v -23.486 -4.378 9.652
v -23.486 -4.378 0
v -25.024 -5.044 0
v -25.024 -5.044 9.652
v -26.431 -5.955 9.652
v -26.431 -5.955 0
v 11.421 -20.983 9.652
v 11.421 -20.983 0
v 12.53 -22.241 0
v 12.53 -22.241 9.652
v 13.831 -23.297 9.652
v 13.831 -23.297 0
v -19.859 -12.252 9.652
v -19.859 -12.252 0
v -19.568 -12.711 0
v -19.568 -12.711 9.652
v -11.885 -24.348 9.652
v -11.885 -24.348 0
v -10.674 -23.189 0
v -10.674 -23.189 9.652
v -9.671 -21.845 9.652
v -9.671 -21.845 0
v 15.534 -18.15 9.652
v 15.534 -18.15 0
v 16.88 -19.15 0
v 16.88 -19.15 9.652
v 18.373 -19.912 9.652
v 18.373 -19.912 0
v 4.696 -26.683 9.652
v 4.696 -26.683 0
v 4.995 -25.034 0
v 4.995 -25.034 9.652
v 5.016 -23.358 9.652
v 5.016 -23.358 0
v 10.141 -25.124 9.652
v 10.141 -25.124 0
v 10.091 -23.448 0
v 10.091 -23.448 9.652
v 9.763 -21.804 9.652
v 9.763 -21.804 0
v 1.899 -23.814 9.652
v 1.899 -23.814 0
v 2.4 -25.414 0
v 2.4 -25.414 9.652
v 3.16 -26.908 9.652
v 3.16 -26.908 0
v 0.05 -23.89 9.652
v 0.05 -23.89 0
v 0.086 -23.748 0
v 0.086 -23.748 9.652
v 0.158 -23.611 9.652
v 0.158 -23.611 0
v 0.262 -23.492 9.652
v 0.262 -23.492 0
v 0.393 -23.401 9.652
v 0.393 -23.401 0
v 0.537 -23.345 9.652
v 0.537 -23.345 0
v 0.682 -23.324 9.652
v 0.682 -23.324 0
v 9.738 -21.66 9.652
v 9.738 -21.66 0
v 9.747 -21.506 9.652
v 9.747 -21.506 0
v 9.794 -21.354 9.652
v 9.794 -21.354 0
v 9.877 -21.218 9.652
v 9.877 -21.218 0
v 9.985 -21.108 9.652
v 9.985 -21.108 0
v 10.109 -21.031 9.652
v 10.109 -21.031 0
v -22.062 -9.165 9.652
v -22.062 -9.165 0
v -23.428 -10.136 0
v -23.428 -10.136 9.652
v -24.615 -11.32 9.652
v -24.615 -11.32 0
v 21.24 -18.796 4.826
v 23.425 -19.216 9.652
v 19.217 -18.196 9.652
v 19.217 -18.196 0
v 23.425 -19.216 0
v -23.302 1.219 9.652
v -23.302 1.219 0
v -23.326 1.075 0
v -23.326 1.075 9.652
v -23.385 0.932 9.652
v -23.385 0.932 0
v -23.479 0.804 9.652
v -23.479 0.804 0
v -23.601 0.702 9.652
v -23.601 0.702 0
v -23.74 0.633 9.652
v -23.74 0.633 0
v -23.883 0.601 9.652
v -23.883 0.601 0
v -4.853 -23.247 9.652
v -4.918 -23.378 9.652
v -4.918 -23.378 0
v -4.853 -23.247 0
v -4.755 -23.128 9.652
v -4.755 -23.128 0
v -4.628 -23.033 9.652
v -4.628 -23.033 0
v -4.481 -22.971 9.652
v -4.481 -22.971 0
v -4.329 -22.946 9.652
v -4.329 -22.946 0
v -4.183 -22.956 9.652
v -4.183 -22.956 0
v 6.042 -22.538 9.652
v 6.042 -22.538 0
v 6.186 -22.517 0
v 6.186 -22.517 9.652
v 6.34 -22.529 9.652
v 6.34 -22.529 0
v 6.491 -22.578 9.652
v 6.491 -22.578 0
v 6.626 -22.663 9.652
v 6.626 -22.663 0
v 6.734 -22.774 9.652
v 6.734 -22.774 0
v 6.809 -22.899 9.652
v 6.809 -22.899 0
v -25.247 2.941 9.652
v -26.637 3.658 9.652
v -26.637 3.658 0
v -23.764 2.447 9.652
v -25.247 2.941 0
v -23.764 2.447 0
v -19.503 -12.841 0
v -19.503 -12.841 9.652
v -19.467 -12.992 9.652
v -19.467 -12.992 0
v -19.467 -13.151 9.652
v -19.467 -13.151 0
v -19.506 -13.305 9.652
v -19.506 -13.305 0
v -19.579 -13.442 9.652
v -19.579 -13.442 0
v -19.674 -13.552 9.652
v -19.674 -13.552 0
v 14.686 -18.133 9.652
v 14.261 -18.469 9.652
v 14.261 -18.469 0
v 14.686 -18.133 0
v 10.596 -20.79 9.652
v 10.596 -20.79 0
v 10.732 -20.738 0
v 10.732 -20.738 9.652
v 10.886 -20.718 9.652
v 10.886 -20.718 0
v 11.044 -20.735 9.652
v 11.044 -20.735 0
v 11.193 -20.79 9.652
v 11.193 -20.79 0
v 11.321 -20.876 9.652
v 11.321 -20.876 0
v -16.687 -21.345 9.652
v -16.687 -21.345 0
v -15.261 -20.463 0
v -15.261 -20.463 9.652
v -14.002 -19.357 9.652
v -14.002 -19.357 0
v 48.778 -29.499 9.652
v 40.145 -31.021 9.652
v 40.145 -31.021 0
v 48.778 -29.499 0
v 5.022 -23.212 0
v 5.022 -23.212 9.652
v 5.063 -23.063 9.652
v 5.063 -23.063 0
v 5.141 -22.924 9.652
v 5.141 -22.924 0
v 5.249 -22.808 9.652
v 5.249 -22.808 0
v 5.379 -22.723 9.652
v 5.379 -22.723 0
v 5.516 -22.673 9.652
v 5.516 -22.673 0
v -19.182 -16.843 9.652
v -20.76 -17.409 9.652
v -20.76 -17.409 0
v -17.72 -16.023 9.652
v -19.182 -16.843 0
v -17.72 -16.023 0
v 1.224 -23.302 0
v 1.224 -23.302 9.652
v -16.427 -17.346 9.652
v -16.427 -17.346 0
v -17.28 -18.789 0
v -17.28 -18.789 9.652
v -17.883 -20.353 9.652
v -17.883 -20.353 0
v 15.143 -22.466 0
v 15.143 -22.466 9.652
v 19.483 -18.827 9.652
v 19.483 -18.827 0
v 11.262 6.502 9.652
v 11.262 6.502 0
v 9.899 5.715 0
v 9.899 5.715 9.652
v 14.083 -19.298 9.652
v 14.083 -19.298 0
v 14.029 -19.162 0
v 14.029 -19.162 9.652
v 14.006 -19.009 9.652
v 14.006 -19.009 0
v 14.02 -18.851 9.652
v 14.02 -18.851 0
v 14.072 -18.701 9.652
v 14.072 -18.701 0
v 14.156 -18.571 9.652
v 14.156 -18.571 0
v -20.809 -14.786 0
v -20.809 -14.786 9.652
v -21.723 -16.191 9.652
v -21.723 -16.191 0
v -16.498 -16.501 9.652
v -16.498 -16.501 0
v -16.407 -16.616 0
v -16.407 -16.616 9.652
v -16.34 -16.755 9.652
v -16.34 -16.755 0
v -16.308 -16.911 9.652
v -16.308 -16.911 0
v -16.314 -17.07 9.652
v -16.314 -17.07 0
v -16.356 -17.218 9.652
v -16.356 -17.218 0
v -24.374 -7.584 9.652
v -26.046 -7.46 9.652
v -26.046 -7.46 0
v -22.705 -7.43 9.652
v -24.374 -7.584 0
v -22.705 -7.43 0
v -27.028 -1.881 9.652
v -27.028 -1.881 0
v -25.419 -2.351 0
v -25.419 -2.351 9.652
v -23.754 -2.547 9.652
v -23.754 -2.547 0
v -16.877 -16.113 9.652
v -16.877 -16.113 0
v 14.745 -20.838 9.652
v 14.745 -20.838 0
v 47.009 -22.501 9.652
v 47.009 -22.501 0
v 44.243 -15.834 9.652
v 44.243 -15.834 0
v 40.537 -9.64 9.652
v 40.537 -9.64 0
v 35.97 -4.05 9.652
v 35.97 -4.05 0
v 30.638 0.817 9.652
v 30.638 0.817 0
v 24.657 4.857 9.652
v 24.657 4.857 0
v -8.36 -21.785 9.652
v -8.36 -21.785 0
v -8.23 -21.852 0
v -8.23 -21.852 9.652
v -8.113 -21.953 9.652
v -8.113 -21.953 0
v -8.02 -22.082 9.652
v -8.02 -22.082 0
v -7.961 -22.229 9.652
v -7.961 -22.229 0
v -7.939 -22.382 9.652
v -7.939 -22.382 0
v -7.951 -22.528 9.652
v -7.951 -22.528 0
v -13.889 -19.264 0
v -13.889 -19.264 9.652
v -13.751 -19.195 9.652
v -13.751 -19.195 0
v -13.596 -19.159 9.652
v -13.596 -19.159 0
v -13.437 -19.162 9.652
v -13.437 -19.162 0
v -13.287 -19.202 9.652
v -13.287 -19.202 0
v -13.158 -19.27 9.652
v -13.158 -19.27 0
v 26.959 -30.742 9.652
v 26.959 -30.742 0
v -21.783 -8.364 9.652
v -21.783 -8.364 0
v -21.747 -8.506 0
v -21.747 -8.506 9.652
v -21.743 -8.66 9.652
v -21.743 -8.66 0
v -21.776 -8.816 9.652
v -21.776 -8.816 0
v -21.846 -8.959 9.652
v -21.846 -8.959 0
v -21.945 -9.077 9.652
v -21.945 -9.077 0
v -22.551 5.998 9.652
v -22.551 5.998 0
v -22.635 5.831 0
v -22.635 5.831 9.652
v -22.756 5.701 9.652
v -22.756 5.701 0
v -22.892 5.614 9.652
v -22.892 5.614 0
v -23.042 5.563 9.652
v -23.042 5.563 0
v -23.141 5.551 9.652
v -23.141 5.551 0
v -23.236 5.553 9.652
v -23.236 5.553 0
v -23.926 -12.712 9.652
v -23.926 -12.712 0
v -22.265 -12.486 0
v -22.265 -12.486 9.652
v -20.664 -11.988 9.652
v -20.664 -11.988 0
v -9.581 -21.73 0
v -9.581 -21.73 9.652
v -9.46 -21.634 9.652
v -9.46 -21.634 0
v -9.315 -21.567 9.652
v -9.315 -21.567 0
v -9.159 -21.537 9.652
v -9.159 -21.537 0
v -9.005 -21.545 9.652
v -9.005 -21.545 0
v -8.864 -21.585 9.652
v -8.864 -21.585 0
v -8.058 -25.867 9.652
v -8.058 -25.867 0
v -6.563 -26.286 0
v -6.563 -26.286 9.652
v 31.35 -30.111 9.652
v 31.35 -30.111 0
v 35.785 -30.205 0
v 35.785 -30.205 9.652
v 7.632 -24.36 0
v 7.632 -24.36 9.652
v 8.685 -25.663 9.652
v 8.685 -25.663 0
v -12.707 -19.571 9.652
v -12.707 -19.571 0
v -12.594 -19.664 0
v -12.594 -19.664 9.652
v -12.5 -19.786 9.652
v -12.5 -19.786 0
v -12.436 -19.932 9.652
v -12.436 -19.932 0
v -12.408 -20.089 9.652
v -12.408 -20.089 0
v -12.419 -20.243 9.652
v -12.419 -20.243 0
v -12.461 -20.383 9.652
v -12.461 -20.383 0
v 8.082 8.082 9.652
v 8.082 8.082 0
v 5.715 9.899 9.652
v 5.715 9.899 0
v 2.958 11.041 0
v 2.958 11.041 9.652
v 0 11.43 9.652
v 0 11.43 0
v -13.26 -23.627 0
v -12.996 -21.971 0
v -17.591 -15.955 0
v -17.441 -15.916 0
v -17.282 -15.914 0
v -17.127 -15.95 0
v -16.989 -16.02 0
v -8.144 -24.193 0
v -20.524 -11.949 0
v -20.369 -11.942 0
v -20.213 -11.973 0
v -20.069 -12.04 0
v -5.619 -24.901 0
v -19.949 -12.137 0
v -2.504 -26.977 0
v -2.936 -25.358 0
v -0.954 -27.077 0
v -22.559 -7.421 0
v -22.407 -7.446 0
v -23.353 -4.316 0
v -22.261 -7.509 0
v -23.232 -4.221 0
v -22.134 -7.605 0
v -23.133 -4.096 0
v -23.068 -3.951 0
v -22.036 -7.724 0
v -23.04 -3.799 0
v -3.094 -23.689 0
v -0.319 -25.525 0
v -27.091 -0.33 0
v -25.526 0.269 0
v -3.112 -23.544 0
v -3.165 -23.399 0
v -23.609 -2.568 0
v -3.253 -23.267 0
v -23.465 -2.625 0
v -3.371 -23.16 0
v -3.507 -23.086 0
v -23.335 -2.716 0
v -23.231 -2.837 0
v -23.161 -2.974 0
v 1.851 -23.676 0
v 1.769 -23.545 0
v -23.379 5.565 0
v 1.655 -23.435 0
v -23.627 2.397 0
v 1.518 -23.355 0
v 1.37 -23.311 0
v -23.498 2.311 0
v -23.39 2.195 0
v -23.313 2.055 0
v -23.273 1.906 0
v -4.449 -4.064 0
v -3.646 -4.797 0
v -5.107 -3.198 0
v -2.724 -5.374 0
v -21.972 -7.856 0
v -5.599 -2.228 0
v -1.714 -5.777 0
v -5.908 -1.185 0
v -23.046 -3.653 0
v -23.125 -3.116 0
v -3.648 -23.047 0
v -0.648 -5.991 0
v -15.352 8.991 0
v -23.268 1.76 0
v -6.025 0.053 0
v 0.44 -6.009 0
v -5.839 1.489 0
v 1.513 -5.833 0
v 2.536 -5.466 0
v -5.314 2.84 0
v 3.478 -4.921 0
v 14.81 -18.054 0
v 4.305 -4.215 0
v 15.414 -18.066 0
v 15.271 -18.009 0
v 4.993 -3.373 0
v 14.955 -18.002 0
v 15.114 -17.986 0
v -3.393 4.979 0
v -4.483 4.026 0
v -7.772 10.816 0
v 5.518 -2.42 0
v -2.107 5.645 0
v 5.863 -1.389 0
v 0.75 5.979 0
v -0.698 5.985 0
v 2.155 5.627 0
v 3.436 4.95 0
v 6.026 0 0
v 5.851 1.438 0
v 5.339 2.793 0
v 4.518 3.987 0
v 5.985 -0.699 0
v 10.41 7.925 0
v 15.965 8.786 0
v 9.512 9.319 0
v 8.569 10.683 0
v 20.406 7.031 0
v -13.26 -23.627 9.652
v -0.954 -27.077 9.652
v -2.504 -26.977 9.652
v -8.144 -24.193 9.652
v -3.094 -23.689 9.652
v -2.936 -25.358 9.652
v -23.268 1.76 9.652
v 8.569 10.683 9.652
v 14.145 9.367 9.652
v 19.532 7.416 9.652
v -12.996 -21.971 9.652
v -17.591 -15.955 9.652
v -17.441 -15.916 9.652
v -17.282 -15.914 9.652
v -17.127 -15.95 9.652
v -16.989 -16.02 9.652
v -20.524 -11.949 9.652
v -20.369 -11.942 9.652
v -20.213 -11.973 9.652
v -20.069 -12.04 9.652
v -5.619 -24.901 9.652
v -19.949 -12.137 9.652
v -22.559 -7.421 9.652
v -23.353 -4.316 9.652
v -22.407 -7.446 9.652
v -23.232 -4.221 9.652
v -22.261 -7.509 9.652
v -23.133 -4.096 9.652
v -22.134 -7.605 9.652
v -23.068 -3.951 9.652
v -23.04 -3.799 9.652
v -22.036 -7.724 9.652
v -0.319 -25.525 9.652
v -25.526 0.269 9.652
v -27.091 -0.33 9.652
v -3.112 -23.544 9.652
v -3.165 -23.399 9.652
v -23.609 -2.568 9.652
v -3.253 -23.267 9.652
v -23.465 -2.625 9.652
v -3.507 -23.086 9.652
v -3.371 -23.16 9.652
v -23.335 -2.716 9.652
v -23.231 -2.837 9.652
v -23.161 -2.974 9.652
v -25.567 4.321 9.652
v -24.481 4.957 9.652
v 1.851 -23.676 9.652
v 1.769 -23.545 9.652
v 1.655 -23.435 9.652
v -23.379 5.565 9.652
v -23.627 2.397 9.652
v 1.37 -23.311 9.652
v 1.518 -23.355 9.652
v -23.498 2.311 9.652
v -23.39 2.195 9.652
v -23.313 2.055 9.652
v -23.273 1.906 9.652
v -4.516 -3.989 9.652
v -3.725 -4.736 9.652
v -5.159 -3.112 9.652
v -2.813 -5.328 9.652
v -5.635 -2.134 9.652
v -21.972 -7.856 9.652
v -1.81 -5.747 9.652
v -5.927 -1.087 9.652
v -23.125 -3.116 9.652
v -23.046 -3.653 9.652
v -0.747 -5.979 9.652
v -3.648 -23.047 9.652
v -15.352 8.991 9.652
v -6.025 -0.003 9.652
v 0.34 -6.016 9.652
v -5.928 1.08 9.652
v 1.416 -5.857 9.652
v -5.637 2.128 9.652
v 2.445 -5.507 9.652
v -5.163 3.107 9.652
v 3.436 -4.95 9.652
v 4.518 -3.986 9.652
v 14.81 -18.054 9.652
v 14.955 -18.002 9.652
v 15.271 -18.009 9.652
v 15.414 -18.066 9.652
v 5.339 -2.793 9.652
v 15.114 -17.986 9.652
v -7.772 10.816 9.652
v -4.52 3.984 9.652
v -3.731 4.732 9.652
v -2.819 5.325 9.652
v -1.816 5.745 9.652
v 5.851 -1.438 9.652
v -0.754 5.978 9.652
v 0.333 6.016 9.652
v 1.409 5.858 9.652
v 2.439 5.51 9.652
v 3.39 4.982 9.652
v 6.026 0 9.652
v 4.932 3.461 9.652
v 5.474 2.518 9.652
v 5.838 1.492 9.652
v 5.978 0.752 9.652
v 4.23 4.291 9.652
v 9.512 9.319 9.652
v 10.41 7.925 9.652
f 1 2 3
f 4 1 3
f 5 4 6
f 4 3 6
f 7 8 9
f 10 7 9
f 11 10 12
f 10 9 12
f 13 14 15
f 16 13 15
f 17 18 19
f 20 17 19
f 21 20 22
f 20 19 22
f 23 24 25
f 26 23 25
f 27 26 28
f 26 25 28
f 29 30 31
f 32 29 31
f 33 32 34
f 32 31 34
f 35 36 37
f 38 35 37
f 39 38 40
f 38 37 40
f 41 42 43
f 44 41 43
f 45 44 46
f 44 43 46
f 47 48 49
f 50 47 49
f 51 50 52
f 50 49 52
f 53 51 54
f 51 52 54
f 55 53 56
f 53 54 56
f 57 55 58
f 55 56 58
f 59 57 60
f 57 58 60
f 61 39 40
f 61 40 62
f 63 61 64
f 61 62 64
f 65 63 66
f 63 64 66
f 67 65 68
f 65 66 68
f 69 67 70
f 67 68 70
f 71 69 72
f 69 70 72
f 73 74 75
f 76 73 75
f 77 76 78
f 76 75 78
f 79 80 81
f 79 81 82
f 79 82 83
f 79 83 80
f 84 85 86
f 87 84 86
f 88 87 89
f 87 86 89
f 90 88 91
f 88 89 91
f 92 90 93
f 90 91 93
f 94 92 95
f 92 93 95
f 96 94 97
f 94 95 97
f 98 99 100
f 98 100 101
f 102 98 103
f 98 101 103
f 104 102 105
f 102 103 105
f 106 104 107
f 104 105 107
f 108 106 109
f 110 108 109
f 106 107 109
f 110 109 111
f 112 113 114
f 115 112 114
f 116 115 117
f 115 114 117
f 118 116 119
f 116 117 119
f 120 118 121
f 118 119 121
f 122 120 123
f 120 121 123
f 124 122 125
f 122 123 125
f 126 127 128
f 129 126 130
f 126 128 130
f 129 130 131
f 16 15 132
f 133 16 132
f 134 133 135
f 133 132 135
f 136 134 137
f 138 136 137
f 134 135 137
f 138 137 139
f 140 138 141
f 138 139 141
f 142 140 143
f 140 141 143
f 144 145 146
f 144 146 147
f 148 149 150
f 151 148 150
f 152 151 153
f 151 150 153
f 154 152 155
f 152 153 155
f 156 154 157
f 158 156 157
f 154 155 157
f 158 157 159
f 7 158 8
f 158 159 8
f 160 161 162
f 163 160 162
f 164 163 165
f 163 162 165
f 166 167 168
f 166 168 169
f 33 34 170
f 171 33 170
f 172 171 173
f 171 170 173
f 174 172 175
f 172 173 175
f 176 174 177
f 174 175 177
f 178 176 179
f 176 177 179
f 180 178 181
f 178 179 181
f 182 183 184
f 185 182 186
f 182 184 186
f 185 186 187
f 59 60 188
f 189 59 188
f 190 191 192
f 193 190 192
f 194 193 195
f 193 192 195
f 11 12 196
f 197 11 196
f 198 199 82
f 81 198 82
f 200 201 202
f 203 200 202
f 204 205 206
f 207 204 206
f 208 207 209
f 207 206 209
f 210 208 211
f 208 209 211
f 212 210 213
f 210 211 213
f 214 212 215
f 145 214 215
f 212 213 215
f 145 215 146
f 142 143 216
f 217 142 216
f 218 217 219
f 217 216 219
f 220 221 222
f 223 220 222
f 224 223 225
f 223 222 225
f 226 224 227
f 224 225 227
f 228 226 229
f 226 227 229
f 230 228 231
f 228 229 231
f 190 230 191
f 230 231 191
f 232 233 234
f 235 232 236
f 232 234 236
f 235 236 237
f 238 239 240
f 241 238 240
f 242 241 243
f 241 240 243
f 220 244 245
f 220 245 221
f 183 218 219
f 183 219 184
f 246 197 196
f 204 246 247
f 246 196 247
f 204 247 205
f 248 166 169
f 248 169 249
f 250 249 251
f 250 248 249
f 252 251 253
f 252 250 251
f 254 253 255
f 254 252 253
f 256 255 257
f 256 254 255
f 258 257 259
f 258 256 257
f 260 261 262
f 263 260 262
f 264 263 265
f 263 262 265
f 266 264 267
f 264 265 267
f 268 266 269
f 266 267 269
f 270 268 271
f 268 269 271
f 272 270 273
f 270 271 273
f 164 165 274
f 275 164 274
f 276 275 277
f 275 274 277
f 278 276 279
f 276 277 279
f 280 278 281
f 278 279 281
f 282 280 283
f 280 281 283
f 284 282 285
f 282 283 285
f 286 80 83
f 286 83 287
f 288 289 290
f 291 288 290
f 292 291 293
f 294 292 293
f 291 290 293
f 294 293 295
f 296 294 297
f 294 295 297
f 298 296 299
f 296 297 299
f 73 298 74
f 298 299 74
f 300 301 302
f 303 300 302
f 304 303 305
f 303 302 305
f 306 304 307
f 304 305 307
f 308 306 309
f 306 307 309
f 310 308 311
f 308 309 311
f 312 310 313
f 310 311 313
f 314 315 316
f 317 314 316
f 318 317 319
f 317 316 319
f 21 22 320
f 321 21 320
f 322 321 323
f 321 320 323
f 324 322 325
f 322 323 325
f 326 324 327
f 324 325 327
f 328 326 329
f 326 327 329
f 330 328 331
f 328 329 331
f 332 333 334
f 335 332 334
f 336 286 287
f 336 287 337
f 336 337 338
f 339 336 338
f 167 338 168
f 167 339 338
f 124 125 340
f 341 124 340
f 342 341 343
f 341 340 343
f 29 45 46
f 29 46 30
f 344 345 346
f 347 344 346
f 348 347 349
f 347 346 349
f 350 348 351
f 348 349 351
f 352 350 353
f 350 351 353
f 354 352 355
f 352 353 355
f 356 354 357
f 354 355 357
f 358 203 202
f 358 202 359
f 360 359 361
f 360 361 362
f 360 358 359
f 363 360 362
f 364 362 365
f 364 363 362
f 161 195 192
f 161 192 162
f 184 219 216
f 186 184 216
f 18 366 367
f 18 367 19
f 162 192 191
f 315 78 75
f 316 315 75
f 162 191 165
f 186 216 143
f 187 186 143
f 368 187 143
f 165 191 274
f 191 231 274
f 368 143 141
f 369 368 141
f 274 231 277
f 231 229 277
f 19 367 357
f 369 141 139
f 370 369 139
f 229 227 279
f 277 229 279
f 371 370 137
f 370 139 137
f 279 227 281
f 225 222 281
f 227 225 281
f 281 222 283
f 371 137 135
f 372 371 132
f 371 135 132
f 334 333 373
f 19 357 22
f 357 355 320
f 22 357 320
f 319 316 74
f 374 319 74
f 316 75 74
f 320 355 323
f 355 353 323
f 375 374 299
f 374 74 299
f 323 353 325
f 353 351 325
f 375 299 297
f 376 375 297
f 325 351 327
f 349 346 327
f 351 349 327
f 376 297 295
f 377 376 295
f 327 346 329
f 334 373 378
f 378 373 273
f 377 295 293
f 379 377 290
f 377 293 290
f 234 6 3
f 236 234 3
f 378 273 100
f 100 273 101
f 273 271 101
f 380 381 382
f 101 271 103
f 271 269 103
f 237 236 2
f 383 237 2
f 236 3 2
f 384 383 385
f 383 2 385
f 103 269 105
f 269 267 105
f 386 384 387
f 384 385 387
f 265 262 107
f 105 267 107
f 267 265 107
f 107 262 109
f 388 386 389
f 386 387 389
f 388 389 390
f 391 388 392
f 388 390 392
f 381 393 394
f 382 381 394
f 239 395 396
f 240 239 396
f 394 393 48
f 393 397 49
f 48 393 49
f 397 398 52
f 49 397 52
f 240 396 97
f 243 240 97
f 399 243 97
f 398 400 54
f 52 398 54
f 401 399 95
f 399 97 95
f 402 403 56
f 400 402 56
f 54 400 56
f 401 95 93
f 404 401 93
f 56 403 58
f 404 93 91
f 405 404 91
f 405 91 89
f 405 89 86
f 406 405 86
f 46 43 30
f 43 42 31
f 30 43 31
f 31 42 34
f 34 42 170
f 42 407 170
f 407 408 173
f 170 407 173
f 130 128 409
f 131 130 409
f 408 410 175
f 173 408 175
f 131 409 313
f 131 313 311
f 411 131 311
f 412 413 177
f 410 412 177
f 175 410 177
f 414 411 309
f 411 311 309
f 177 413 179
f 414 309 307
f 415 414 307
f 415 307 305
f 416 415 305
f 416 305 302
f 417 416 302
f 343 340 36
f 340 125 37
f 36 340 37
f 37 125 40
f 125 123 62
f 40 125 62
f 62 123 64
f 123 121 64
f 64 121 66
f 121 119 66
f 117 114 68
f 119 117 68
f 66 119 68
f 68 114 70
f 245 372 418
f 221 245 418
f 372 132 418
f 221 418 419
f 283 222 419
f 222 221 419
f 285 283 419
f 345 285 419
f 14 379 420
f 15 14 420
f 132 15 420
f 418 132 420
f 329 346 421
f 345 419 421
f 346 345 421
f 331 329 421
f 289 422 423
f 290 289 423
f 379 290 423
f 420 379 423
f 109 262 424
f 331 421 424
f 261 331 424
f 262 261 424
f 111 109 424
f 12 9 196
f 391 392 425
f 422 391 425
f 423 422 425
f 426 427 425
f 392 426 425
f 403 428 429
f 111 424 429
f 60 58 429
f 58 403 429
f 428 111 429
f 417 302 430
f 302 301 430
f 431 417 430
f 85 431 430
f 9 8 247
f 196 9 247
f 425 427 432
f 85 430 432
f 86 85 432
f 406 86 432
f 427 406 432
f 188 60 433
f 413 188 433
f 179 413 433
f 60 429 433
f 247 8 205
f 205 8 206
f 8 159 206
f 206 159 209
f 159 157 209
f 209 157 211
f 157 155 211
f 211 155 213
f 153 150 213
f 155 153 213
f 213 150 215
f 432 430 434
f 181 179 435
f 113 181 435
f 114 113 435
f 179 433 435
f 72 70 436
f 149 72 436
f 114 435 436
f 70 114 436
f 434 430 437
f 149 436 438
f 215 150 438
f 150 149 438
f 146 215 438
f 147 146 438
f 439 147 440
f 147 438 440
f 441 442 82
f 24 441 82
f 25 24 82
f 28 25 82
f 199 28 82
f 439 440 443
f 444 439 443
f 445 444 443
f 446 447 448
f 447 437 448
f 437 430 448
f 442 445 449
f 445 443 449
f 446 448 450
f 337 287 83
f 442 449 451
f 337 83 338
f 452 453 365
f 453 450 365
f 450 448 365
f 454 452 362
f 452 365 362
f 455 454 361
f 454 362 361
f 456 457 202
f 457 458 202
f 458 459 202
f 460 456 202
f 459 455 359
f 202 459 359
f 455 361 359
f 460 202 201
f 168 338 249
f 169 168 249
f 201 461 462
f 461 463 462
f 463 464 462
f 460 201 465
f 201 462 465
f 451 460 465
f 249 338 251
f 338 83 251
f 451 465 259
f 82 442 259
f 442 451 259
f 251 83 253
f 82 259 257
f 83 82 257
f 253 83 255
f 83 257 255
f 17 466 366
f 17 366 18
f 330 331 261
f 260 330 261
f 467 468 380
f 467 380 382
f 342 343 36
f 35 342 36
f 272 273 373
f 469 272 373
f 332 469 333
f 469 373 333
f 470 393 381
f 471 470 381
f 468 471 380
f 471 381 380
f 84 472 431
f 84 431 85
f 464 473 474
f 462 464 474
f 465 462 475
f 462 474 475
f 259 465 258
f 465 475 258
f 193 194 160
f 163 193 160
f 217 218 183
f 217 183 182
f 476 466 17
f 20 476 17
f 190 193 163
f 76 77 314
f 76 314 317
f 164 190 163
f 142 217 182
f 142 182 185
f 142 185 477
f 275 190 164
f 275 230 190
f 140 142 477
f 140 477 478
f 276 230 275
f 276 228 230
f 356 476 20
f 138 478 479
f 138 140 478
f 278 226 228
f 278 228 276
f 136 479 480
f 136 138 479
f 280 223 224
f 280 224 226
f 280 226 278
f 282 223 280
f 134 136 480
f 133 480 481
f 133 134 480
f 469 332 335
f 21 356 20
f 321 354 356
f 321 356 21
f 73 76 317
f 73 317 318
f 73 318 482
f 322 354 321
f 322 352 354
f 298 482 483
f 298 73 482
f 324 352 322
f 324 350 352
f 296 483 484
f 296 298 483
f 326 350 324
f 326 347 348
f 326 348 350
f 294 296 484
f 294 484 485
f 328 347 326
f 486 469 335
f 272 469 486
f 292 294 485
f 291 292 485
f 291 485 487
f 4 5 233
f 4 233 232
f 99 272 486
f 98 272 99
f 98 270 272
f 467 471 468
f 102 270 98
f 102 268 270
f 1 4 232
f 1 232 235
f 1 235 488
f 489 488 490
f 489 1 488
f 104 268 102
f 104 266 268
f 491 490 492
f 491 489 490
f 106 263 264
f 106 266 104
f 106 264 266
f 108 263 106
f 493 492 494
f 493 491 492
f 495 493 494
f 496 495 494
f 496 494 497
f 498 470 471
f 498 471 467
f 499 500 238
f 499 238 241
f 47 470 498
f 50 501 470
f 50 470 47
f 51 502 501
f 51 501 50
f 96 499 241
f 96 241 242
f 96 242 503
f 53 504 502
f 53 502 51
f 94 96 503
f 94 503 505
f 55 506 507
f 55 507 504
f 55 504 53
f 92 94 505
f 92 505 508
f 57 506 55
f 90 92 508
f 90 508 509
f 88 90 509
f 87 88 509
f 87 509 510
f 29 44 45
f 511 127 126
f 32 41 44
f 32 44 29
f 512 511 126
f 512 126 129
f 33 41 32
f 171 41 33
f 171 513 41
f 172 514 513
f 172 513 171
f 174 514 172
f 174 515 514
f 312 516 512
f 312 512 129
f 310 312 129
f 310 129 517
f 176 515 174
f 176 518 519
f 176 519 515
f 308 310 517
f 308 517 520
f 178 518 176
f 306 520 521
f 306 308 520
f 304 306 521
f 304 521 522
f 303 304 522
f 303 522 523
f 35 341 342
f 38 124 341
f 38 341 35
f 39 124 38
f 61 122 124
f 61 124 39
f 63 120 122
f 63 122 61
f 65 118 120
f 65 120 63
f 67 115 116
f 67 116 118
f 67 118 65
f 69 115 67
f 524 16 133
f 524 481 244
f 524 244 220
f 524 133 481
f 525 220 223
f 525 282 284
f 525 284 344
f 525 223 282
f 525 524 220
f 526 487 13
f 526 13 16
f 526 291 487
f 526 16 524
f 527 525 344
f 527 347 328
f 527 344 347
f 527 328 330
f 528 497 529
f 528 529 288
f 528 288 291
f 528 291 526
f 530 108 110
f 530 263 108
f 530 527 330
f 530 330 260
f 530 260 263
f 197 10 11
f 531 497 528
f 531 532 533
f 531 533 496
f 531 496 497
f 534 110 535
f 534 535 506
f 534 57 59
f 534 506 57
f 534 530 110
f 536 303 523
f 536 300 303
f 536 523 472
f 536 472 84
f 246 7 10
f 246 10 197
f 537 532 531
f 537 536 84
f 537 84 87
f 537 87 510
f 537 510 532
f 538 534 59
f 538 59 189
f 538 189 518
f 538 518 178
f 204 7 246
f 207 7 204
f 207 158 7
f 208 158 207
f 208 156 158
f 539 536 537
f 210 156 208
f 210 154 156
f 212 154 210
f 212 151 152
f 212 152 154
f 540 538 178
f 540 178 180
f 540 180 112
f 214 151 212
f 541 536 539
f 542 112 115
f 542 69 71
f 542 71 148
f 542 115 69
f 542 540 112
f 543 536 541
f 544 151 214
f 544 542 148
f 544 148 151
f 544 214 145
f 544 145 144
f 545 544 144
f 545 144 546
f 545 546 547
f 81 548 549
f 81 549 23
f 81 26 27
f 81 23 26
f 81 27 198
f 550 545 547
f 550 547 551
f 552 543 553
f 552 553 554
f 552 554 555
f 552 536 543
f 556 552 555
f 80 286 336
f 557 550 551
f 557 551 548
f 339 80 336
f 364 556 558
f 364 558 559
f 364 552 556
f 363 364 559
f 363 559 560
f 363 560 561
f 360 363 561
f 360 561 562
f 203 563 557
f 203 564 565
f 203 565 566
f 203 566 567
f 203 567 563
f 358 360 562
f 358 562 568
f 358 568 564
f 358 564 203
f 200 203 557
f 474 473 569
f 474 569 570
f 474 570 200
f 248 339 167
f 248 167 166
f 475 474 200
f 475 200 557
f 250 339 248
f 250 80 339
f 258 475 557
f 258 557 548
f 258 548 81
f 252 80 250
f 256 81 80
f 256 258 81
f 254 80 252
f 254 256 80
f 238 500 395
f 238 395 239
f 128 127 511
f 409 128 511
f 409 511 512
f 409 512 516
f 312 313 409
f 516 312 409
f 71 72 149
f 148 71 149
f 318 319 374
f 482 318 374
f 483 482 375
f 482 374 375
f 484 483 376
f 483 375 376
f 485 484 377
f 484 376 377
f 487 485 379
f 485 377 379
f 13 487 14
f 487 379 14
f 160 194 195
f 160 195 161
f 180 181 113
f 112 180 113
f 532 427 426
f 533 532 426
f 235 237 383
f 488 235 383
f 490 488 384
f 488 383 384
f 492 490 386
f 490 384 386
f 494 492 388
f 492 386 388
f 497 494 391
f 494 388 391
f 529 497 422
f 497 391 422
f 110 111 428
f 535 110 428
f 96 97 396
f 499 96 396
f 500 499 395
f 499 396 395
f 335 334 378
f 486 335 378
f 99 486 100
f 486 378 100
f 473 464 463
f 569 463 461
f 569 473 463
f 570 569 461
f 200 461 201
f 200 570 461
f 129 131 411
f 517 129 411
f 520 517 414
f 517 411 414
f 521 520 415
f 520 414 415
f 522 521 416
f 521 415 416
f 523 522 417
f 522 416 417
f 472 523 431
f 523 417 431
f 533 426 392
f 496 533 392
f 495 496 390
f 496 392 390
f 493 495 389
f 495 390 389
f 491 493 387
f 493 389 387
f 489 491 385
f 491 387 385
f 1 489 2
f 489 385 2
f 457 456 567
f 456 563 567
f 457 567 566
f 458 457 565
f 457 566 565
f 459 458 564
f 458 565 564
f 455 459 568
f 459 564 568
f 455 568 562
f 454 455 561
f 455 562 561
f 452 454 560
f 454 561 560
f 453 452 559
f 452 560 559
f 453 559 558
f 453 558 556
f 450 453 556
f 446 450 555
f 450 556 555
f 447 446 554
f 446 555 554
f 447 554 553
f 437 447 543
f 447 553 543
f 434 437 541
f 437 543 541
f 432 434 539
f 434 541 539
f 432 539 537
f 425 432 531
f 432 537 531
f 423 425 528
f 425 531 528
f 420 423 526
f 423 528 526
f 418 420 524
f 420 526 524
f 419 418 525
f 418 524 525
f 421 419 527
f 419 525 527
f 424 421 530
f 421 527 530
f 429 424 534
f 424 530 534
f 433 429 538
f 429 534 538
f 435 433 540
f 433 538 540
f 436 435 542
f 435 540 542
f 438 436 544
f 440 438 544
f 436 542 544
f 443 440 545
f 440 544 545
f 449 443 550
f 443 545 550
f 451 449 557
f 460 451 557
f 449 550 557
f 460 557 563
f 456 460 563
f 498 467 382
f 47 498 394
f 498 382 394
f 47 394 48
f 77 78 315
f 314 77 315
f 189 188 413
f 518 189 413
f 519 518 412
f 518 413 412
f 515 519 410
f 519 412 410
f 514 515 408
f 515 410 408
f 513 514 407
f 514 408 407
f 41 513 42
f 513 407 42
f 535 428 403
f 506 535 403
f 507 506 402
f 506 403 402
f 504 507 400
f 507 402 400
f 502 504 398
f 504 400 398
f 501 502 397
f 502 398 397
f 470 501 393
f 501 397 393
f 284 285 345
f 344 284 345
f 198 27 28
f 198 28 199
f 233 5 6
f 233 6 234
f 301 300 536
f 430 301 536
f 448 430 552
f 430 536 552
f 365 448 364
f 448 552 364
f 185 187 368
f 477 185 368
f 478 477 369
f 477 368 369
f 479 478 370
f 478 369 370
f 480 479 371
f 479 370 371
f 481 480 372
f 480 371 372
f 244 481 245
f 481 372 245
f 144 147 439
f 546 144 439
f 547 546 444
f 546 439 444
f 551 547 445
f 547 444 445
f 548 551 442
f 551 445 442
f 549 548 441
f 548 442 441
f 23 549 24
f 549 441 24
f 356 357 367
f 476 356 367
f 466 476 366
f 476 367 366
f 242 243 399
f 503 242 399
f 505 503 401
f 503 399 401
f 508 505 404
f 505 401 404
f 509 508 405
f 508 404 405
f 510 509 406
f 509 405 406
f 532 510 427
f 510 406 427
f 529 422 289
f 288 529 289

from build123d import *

# Parameters (mm, degrees)
SKETCH3_R               = 40.64
GEARBODY_DEPTH          = 9.652
TOOTHCUT_DEPTH          = 59.278472046
CIRPATTERN1_COUNT       = 30
SCALE1_SCALE_X          = 0.666666667
SCALE1_SCALE_Y          = 0.666666667
SCALE1_SCALE_Z          = 1
BOREDIA_R               = 6.025500014
BORE_DEPTH              = 12700
CUT_EXTRUDE1_DEPTH      = 40.49986663
BOSS_EXTRUDE1_DEPTH     = 9.652
BODY_TUBE_CUT_OUT_DEPTH = 59.606597669


with BuildPart() as part:
    # Sketch3 → gearBody (new body)
    with BuildSketch(Plane.XY):
        Circle(SKETCH3_R)
    extrude(amount=GEARBODY_DEPTH)

    # Sketch2 → toothCut (cut, through all)
    with BuildSketch(Plane.XY):
        with BuildLine():
            ThreePointArc((34.901466352, -2.640387833), (34.929801576, -2.234493965), (34.953416534, -1.828298136))
            ThreePointArc((34.953416534, -1.828298136), (35.218972856, -1.205360668), (35.823821616, -0.900845929))
            ThreePointArc((35.823821616, -0.900845929), (41.902420255, 1.180053047), (46.567899911, 5.597382731))
            ThreePointArc((46.567899911, 5.597382731), (46.807414621, -2.994316622), (45.4750933, -11.485464069))
            ThreePointArc((45.4750933, -11.485464069), (41.410501506, -6.509663078), (35.646600115, -3.671187658))
            ThreePointArc((35.646600115, -3.671187658), (35.08548304, -3.292084932), (34.901466352, -2.640387833))
        make_face()
    toothcut = extrude(amount=TOOTHCUT_DEPTH, mode=Mode.SUBTRACT)

    # CirPattern1: toothCut ×30 about axis
    cirpattern1_axis = Axis((0, 0, 0), (0, 0, 1))
    for i in range(1, CIRPATTERN1_COUNT):
        add(toothcut.rotate(cirpattern1_axis, i * 360 / CIRPATTERN1_COUNT), mode=Mode.SUBTRACT)


with BuildPart() as part_1:
    # Scale1: scaled about (0, 0, 4.826)
    add(part.part.scale((SCALE1_SCALE_X, SCALE1_SCALE_Y, SCALE1_SCALE_Z), about=(0, 0, 4.826)))

    # boreDia → bore (cut, symmetric)
    with BuildSketch(Plane.XY):
        Circle(BOREDIA_R)
    extrude(amount=BORE_DEPTH, both=True, mode=Mode.SUBTRACT)

    # Sketch4 → Cut-Extrude1 (cut, through all)
    with BuildSketch(Plane.XY.offset(9.652)):
        with BuildLine():
            ThreePointArc((-27.126729009, 3.341060233), (0, 11.43), (27.126729009, 3.341060233))
            ThreePointArc((27.126729009, 3.341060233), (0, 27.33170522), (-27.126729009, 3.341060233))
        make_face()
    extrude(amount=-CUT_EXTRUDE1_DEPTH, mode=Mode.SUBTRACT)

    # Sketch5 → Boss-Extrude1 (add)
    with BuildSketch(Plane.XY.offset(9.652)):
        with BuildLine():
            Line((23.424769806, -19.215611802), (26.959165805, -30.742024145))
            ThreePointArc((26.959165805, -30.742024145), (33.569316663, -30.066976699), (40.144948283, -31.021362479))
            Line((40.144948283, -31.021362479), (48.777528007, -29.49920576))
            ThreePointArc((48.777528007, -29.49920576), (34.808245264, -2.863556342), (8.00379846, 10.779035488))
            add(Edge.make_bspline(
                [(8.00379846, 10.779035488), (4.700723166, -16.48766374), (23.424769806, -19.215611802)],
                knots=[0, 0, 0, 1, 1, 1], degree=2))
        make_face()
    extrude(amount=-BOSS_EXTRUDE1_DEPTH)

    # Sketch6 → Body Tube Cut Out (cut, through all)
    with BuildSketch(Plane.XY.offset(9.652)):
        with BuildLine():
            Line((11.262487171, 6.5024), (9.898670365, 5.715))
            ThreePointArc((9.898670365, 5.715), (5.715, 9.898670365), (0, 11.43))
            ThreePointArc((0, 11.43), (4.300943022, 11.242910221), (8.569394121, 10.683054275))
            ThreePointArc((8.569394121, 10.683054275), (9.966823016, 8.625504533), (11.262487171, 6.5024))
        make_face()
    extrude(amount=-BODY_TUBE_CUT_OUT_DEPTH, mode=Mode.SUBTRACT)


solid = part_1.part
